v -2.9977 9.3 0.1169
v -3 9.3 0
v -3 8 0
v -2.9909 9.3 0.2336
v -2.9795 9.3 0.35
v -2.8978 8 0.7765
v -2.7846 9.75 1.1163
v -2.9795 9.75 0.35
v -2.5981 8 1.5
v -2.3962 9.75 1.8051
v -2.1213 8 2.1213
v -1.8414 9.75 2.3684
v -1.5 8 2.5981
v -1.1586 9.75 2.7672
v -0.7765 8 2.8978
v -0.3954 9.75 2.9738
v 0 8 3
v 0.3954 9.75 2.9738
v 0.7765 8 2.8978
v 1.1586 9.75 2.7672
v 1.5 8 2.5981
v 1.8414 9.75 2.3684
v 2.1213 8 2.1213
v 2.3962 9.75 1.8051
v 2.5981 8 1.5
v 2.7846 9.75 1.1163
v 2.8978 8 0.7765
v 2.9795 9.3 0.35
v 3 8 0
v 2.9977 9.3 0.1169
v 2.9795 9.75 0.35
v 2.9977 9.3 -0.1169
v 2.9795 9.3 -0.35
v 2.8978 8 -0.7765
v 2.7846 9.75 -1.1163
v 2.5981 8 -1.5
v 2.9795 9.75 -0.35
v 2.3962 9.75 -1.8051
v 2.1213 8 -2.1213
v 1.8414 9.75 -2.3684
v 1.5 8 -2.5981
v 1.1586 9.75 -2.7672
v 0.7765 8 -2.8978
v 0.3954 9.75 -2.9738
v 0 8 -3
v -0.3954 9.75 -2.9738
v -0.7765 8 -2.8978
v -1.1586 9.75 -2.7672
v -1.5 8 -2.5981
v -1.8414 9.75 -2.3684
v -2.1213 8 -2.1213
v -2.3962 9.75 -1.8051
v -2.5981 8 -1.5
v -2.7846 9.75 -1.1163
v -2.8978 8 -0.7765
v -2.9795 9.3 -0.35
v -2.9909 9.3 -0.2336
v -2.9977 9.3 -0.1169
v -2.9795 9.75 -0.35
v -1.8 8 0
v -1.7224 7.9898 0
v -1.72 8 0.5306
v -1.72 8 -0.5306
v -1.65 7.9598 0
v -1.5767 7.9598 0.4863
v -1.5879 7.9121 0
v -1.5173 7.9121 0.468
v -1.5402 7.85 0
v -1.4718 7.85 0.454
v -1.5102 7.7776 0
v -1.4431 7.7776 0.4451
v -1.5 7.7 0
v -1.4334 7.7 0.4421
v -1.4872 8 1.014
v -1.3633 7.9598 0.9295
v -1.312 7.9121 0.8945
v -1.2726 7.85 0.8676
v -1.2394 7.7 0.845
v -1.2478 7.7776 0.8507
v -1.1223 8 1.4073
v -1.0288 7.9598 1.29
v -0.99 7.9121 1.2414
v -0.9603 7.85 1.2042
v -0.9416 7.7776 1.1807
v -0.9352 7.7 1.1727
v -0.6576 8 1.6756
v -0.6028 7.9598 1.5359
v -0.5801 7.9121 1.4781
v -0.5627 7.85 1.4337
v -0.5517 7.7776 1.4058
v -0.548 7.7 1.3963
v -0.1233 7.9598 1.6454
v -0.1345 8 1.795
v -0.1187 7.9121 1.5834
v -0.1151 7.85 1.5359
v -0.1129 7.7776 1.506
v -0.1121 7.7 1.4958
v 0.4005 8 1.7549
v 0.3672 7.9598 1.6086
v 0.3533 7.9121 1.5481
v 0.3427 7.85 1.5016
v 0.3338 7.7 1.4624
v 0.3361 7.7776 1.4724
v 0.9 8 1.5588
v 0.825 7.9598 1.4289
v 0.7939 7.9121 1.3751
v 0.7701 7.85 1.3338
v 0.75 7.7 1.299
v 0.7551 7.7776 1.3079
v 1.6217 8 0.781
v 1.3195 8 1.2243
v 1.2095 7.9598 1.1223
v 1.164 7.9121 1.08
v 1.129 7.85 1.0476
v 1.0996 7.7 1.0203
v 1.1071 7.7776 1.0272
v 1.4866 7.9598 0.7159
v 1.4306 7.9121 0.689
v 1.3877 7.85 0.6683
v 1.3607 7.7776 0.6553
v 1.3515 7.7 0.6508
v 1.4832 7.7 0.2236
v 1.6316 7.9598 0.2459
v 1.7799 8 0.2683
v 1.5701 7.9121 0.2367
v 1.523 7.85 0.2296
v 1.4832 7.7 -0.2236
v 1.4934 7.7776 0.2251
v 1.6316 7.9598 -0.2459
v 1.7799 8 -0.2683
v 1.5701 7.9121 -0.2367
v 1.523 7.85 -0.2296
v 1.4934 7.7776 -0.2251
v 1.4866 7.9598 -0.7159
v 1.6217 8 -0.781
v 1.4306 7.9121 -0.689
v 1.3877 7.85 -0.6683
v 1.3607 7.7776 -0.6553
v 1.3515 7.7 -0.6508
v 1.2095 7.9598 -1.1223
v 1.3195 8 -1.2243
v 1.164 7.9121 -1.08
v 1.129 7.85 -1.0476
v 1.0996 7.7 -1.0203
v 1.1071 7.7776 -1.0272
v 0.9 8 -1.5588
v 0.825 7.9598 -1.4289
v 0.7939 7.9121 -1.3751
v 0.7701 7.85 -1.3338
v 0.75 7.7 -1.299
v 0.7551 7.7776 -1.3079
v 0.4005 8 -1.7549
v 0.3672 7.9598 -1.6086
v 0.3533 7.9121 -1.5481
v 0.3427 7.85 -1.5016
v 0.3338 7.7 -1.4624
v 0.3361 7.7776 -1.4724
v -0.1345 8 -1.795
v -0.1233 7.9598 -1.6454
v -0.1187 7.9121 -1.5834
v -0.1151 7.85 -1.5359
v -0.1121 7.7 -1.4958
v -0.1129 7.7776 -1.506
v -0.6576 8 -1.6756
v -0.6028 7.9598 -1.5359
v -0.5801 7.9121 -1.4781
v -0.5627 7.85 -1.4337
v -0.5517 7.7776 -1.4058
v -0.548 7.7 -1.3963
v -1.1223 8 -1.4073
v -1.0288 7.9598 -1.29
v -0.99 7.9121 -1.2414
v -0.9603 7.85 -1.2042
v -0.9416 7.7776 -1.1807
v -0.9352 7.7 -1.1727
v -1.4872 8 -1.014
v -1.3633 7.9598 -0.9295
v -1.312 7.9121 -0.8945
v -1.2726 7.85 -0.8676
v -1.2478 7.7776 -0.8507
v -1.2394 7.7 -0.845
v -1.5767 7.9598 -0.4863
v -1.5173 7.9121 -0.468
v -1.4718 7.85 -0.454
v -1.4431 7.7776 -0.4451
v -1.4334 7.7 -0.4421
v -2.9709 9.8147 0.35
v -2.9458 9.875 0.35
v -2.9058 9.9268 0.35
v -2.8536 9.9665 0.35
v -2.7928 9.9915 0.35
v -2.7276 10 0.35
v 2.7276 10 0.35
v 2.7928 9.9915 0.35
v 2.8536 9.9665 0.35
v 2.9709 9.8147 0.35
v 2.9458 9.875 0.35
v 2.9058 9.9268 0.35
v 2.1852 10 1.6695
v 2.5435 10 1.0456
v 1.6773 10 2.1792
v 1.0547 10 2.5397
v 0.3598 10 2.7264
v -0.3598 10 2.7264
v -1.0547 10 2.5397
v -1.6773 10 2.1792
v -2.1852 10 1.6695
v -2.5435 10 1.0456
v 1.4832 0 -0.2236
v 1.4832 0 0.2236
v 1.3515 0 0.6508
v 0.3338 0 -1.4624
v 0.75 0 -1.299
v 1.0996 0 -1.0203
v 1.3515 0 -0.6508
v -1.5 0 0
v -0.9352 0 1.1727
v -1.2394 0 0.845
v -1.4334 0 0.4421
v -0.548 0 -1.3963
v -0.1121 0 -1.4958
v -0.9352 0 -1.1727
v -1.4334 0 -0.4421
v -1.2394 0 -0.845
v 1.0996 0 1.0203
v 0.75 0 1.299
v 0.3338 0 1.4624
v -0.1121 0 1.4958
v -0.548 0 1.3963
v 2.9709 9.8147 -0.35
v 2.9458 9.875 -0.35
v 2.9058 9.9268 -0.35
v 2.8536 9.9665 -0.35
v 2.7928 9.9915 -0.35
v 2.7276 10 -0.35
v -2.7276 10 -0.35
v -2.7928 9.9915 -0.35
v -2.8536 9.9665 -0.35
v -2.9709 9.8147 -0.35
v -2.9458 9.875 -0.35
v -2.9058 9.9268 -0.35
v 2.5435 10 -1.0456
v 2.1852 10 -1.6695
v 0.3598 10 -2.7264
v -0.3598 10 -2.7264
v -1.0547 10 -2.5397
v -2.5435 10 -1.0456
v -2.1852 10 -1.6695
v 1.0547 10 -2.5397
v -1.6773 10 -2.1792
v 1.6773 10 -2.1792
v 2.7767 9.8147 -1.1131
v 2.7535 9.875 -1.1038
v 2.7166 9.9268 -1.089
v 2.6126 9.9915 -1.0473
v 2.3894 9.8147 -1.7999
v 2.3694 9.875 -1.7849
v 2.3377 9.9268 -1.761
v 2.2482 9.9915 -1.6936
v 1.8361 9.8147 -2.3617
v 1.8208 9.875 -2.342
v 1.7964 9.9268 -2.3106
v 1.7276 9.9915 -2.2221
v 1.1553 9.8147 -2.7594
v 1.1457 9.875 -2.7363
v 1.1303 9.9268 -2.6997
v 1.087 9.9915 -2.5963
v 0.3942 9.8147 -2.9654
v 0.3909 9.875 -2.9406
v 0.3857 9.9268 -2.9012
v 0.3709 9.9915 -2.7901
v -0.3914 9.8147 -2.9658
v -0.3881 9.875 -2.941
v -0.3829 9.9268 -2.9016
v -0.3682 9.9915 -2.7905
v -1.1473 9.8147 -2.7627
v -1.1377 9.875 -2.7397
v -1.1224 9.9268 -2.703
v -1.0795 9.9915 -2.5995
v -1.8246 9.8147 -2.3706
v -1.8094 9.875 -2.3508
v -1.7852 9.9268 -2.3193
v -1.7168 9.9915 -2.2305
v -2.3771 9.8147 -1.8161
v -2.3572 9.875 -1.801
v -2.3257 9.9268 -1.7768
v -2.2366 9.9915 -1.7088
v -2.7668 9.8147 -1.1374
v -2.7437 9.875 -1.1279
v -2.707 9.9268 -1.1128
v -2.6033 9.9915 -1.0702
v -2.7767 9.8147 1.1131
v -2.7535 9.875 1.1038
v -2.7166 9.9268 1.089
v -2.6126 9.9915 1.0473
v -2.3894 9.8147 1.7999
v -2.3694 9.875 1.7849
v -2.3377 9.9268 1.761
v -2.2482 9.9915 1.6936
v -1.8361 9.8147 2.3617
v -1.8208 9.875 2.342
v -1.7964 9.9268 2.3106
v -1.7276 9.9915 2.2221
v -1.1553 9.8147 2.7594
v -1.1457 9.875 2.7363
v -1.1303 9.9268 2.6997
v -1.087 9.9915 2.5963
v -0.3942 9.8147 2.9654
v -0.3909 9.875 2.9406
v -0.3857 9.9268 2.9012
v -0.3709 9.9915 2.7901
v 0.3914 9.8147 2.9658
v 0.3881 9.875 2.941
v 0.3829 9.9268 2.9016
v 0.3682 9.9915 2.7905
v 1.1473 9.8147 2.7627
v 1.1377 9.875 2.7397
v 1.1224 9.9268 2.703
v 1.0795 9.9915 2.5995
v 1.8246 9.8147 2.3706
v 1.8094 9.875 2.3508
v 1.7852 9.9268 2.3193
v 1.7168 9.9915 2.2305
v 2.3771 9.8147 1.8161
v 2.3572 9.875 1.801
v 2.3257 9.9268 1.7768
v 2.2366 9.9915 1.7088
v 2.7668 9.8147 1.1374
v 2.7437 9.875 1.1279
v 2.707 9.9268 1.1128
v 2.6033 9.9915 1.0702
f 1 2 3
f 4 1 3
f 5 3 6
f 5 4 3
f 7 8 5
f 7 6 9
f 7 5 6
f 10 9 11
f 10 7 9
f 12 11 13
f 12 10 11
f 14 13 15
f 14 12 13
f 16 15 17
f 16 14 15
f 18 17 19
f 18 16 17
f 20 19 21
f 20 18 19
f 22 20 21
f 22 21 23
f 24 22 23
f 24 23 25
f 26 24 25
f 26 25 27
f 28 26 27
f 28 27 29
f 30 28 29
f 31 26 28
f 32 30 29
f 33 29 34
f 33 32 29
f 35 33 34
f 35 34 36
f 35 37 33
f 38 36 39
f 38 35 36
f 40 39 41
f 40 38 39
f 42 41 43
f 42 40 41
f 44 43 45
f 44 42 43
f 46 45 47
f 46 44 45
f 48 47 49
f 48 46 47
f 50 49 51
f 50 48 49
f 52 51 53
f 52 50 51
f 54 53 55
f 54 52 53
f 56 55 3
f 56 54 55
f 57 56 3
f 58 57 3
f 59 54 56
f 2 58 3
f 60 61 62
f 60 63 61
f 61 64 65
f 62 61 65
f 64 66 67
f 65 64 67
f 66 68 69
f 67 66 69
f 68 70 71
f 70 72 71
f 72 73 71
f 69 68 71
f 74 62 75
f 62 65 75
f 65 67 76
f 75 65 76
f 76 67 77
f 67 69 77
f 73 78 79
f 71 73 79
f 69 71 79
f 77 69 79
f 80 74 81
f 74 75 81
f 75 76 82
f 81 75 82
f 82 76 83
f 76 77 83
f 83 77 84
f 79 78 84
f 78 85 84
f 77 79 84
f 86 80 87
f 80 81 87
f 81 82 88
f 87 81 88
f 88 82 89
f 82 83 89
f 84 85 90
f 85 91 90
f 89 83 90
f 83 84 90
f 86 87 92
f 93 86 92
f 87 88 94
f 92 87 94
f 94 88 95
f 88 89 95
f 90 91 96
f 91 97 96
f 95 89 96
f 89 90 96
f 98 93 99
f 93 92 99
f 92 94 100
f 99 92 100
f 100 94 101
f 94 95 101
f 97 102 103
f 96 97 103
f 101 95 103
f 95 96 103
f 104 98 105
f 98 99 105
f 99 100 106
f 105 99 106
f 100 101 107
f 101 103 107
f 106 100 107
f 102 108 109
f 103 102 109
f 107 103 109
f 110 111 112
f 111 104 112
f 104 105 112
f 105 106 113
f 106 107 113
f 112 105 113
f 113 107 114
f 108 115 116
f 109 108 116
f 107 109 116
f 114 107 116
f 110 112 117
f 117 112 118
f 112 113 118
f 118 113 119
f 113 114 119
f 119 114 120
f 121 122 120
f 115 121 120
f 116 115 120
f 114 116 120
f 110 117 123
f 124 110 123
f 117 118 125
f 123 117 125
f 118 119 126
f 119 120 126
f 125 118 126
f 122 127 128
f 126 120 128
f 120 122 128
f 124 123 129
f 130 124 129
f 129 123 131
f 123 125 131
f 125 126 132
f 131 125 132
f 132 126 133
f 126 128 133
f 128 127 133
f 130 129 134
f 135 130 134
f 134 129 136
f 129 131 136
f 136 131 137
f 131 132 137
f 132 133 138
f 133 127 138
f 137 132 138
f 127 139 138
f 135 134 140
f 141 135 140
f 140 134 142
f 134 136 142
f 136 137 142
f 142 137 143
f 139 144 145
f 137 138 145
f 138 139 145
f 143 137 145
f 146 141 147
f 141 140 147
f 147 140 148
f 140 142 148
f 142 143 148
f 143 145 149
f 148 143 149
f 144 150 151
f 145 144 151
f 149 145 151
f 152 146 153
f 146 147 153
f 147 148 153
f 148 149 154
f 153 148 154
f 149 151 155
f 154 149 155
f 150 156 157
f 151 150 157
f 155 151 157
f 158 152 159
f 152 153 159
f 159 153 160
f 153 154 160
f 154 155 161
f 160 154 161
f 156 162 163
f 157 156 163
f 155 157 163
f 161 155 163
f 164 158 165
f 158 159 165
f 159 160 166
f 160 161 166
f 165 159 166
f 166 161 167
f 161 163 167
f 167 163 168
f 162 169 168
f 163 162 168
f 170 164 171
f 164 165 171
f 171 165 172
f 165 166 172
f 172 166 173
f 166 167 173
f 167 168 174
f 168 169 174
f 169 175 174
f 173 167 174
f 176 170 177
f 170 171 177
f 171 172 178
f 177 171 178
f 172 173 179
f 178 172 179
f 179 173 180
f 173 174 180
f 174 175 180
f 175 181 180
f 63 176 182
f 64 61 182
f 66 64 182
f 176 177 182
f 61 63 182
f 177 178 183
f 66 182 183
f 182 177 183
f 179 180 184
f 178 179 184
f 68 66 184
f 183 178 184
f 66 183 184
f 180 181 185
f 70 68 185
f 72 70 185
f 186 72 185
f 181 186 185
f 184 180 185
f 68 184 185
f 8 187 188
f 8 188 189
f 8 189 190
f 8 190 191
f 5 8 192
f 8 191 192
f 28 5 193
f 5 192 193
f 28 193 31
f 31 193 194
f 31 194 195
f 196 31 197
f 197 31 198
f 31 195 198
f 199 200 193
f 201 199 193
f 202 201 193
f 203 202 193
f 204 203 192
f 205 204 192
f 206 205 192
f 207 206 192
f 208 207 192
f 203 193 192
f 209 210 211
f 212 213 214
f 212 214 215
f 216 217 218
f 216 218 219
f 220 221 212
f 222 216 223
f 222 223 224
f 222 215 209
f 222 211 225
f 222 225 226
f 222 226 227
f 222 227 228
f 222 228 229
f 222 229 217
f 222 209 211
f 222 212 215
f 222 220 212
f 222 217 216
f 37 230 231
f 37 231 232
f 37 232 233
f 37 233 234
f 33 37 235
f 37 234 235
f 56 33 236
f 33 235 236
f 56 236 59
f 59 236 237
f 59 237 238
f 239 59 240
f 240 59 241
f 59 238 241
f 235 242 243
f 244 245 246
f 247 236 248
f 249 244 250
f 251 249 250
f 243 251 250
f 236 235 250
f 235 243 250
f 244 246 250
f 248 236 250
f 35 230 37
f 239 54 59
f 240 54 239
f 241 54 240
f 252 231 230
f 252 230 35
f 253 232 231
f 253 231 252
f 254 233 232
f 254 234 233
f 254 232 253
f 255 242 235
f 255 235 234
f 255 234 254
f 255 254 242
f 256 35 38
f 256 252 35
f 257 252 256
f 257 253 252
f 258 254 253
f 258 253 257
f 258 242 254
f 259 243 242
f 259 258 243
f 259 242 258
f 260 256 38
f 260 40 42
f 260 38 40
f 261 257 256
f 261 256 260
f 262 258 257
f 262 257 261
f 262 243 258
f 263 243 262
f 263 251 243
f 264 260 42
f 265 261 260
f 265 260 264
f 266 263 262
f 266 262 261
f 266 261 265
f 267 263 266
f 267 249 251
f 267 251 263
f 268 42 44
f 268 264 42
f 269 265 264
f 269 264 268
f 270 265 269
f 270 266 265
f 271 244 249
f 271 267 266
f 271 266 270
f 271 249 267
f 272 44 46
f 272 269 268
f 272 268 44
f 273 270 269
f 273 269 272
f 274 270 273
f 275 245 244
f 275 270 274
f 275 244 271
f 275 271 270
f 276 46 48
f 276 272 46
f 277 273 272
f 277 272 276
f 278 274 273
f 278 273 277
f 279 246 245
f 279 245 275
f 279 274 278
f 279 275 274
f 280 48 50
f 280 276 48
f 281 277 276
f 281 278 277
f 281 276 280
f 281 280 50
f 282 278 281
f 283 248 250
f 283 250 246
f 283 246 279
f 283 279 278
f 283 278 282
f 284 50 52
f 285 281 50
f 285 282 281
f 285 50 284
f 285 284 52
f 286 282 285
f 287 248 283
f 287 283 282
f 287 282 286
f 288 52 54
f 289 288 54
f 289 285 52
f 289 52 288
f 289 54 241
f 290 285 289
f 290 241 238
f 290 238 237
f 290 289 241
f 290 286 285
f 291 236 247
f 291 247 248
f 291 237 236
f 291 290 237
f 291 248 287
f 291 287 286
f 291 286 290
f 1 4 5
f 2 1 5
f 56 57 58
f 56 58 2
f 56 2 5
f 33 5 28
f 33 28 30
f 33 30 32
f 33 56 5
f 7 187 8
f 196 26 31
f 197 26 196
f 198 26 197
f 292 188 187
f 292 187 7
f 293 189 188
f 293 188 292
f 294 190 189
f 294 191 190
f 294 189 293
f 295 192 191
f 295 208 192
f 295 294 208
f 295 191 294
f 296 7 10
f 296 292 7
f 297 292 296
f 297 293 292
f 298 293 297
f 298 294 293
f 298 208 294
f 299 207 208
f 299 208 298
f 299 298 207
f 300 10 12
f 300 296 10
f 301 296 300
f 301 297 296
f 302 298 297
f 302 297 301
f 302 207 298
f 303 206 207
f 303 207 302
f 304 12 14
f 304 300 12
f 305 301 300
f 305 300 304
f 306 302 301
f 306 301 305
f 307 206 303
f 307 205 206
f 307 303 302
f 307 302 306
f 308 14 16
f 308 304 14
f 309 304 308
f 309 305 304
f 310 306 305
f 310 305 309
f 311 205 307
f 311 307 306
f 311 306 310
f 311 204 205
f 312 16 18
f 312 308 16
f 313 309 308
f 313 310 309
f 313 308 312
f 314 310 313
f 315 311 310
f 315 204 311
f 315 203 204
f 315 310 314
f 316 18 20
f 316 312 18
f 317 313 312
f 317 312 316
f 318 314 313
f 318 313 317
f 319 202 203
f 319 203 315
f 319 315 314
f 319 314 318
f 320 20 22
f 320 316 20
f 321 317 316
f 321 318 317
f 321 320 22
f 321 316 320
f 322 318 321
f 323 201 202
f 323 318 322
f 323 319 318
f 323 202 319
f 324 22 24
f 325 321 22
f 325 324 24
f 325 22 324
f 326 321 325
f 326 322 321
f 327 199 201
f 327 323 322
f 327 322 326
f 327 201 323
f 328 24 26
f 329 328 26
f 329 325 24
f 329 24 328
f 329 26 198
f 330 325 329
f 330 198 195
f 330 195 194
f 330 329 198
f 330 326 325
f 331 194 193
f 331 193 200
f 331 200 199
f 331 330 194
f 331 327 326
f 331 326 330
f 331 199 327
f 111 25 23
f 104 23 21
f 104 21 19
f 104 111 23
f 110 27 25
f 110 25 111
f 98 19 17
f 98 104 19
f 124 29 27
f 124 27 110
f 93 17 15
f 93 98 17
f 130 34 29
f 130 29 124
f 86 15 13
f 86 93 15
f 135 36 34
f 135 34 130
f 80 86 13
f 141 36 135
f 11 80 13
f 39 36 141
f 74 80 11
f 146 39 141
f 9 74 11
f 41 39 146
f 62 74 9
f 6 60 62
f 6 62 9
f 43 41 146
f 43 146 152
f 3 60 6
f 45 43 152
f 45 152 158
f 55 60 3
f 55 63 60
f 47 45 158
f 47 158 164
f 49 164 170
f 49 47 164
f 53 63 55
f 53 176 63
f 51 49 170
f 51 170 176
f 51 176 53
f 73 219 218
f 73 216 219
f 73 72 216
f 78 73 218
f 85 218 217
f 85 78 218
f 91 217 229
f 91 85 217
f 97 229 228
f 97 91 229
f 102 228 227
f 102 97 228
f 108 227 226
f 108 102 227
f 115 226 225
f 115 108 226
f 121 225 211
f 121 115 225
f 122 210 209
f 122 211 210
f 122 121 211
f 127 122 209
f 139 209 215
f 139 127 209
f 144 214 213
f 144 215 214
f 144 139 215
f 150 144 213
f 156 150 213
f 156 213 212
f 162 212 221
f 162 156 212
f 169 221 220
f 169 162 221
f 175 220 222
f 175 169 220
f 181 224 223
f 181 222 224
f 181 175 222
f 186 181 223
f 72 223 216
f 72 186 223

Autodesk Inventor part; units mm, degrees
ref_plane "YZ Plane" through (0, 0, 0) normal (1, 0, 0) x (0, 1, 0)
ref_plane "XZ Plane" through (0, 0, 0) normal (0, 1, 0) x (-1, 0, 0)
ref_plane "XY Plane" through (0, 0, 0) normal (0, 0, 1) x (1, 0, 0)
sketch "Sketch1" plane through (0, 0, 0) normal (0, 0, 1) x (1, 0, 0)
  line L0 (0, 0) -> (-1.5, 0)
  line L1 (-1.5, 0) -> (-1.5, 7)
  line L2 (-1.5, 7) -> (-1.5, 7)
  line L3 (-1.5, 7) -> (-1.5, 8)
  line L4 (-1.5, 8) -> (-3, 8)
  line L5 (-3, 8) -> (-3, 10)
  line L6 (-3, 10) -> (0, 10)
  line L7 (0, 10) -> (0, 0)
  dimension "d0" = 2
  dimension "d1" = 3
  dimension "d2" = 1.5
  dimension "d3" = 0
  dimension "d4" = 1
  dimension "d5" = 10
  dimension "d6" = 90
revolve "Revolution1" add sketch "Sketch1" angle 360 about axis through (0, 10, 0) along (0, -1, 0)
thread "Thread1" size "M3x0.5" class "6g" standard "ANSI Metric M Profile" length 27
sketch "Sketch2" plane through (0, 10, 0) normal (0, 1, 0) x (1, 0, 0)
  line L0 (5, 0.35) -> (-5, 0.35)
  line L1 (-5, 0.35) -> (-5, -0.35)
  line L2 (-5, -0.35) -> (5, -0.35)
  line L3 (5, -0.35) -> (5, 0.35)
  line L4 (5, 0.35) -> (-5, -0.35) construction
  line L5 (-5, 0.35) -> (5, -0.35) construction
  point P0 (0, 0)
  dimension "d10" = 10
  dimension "d11" = 0.7
fillet "Fillet1" radius 0.25 1 edges at (3, 10, 0)
extrude "Extrusion2" cut sketch "Sketch2" against normal blind 0.7
fillet "Fillet2" radius 0.3 1 edges at (1.5, 8, 0)
properties part number "TorsionOscillator-Screw-M3-Brass-CheeseHead-8mm-Std" material "Brass, Soft Yellow"
